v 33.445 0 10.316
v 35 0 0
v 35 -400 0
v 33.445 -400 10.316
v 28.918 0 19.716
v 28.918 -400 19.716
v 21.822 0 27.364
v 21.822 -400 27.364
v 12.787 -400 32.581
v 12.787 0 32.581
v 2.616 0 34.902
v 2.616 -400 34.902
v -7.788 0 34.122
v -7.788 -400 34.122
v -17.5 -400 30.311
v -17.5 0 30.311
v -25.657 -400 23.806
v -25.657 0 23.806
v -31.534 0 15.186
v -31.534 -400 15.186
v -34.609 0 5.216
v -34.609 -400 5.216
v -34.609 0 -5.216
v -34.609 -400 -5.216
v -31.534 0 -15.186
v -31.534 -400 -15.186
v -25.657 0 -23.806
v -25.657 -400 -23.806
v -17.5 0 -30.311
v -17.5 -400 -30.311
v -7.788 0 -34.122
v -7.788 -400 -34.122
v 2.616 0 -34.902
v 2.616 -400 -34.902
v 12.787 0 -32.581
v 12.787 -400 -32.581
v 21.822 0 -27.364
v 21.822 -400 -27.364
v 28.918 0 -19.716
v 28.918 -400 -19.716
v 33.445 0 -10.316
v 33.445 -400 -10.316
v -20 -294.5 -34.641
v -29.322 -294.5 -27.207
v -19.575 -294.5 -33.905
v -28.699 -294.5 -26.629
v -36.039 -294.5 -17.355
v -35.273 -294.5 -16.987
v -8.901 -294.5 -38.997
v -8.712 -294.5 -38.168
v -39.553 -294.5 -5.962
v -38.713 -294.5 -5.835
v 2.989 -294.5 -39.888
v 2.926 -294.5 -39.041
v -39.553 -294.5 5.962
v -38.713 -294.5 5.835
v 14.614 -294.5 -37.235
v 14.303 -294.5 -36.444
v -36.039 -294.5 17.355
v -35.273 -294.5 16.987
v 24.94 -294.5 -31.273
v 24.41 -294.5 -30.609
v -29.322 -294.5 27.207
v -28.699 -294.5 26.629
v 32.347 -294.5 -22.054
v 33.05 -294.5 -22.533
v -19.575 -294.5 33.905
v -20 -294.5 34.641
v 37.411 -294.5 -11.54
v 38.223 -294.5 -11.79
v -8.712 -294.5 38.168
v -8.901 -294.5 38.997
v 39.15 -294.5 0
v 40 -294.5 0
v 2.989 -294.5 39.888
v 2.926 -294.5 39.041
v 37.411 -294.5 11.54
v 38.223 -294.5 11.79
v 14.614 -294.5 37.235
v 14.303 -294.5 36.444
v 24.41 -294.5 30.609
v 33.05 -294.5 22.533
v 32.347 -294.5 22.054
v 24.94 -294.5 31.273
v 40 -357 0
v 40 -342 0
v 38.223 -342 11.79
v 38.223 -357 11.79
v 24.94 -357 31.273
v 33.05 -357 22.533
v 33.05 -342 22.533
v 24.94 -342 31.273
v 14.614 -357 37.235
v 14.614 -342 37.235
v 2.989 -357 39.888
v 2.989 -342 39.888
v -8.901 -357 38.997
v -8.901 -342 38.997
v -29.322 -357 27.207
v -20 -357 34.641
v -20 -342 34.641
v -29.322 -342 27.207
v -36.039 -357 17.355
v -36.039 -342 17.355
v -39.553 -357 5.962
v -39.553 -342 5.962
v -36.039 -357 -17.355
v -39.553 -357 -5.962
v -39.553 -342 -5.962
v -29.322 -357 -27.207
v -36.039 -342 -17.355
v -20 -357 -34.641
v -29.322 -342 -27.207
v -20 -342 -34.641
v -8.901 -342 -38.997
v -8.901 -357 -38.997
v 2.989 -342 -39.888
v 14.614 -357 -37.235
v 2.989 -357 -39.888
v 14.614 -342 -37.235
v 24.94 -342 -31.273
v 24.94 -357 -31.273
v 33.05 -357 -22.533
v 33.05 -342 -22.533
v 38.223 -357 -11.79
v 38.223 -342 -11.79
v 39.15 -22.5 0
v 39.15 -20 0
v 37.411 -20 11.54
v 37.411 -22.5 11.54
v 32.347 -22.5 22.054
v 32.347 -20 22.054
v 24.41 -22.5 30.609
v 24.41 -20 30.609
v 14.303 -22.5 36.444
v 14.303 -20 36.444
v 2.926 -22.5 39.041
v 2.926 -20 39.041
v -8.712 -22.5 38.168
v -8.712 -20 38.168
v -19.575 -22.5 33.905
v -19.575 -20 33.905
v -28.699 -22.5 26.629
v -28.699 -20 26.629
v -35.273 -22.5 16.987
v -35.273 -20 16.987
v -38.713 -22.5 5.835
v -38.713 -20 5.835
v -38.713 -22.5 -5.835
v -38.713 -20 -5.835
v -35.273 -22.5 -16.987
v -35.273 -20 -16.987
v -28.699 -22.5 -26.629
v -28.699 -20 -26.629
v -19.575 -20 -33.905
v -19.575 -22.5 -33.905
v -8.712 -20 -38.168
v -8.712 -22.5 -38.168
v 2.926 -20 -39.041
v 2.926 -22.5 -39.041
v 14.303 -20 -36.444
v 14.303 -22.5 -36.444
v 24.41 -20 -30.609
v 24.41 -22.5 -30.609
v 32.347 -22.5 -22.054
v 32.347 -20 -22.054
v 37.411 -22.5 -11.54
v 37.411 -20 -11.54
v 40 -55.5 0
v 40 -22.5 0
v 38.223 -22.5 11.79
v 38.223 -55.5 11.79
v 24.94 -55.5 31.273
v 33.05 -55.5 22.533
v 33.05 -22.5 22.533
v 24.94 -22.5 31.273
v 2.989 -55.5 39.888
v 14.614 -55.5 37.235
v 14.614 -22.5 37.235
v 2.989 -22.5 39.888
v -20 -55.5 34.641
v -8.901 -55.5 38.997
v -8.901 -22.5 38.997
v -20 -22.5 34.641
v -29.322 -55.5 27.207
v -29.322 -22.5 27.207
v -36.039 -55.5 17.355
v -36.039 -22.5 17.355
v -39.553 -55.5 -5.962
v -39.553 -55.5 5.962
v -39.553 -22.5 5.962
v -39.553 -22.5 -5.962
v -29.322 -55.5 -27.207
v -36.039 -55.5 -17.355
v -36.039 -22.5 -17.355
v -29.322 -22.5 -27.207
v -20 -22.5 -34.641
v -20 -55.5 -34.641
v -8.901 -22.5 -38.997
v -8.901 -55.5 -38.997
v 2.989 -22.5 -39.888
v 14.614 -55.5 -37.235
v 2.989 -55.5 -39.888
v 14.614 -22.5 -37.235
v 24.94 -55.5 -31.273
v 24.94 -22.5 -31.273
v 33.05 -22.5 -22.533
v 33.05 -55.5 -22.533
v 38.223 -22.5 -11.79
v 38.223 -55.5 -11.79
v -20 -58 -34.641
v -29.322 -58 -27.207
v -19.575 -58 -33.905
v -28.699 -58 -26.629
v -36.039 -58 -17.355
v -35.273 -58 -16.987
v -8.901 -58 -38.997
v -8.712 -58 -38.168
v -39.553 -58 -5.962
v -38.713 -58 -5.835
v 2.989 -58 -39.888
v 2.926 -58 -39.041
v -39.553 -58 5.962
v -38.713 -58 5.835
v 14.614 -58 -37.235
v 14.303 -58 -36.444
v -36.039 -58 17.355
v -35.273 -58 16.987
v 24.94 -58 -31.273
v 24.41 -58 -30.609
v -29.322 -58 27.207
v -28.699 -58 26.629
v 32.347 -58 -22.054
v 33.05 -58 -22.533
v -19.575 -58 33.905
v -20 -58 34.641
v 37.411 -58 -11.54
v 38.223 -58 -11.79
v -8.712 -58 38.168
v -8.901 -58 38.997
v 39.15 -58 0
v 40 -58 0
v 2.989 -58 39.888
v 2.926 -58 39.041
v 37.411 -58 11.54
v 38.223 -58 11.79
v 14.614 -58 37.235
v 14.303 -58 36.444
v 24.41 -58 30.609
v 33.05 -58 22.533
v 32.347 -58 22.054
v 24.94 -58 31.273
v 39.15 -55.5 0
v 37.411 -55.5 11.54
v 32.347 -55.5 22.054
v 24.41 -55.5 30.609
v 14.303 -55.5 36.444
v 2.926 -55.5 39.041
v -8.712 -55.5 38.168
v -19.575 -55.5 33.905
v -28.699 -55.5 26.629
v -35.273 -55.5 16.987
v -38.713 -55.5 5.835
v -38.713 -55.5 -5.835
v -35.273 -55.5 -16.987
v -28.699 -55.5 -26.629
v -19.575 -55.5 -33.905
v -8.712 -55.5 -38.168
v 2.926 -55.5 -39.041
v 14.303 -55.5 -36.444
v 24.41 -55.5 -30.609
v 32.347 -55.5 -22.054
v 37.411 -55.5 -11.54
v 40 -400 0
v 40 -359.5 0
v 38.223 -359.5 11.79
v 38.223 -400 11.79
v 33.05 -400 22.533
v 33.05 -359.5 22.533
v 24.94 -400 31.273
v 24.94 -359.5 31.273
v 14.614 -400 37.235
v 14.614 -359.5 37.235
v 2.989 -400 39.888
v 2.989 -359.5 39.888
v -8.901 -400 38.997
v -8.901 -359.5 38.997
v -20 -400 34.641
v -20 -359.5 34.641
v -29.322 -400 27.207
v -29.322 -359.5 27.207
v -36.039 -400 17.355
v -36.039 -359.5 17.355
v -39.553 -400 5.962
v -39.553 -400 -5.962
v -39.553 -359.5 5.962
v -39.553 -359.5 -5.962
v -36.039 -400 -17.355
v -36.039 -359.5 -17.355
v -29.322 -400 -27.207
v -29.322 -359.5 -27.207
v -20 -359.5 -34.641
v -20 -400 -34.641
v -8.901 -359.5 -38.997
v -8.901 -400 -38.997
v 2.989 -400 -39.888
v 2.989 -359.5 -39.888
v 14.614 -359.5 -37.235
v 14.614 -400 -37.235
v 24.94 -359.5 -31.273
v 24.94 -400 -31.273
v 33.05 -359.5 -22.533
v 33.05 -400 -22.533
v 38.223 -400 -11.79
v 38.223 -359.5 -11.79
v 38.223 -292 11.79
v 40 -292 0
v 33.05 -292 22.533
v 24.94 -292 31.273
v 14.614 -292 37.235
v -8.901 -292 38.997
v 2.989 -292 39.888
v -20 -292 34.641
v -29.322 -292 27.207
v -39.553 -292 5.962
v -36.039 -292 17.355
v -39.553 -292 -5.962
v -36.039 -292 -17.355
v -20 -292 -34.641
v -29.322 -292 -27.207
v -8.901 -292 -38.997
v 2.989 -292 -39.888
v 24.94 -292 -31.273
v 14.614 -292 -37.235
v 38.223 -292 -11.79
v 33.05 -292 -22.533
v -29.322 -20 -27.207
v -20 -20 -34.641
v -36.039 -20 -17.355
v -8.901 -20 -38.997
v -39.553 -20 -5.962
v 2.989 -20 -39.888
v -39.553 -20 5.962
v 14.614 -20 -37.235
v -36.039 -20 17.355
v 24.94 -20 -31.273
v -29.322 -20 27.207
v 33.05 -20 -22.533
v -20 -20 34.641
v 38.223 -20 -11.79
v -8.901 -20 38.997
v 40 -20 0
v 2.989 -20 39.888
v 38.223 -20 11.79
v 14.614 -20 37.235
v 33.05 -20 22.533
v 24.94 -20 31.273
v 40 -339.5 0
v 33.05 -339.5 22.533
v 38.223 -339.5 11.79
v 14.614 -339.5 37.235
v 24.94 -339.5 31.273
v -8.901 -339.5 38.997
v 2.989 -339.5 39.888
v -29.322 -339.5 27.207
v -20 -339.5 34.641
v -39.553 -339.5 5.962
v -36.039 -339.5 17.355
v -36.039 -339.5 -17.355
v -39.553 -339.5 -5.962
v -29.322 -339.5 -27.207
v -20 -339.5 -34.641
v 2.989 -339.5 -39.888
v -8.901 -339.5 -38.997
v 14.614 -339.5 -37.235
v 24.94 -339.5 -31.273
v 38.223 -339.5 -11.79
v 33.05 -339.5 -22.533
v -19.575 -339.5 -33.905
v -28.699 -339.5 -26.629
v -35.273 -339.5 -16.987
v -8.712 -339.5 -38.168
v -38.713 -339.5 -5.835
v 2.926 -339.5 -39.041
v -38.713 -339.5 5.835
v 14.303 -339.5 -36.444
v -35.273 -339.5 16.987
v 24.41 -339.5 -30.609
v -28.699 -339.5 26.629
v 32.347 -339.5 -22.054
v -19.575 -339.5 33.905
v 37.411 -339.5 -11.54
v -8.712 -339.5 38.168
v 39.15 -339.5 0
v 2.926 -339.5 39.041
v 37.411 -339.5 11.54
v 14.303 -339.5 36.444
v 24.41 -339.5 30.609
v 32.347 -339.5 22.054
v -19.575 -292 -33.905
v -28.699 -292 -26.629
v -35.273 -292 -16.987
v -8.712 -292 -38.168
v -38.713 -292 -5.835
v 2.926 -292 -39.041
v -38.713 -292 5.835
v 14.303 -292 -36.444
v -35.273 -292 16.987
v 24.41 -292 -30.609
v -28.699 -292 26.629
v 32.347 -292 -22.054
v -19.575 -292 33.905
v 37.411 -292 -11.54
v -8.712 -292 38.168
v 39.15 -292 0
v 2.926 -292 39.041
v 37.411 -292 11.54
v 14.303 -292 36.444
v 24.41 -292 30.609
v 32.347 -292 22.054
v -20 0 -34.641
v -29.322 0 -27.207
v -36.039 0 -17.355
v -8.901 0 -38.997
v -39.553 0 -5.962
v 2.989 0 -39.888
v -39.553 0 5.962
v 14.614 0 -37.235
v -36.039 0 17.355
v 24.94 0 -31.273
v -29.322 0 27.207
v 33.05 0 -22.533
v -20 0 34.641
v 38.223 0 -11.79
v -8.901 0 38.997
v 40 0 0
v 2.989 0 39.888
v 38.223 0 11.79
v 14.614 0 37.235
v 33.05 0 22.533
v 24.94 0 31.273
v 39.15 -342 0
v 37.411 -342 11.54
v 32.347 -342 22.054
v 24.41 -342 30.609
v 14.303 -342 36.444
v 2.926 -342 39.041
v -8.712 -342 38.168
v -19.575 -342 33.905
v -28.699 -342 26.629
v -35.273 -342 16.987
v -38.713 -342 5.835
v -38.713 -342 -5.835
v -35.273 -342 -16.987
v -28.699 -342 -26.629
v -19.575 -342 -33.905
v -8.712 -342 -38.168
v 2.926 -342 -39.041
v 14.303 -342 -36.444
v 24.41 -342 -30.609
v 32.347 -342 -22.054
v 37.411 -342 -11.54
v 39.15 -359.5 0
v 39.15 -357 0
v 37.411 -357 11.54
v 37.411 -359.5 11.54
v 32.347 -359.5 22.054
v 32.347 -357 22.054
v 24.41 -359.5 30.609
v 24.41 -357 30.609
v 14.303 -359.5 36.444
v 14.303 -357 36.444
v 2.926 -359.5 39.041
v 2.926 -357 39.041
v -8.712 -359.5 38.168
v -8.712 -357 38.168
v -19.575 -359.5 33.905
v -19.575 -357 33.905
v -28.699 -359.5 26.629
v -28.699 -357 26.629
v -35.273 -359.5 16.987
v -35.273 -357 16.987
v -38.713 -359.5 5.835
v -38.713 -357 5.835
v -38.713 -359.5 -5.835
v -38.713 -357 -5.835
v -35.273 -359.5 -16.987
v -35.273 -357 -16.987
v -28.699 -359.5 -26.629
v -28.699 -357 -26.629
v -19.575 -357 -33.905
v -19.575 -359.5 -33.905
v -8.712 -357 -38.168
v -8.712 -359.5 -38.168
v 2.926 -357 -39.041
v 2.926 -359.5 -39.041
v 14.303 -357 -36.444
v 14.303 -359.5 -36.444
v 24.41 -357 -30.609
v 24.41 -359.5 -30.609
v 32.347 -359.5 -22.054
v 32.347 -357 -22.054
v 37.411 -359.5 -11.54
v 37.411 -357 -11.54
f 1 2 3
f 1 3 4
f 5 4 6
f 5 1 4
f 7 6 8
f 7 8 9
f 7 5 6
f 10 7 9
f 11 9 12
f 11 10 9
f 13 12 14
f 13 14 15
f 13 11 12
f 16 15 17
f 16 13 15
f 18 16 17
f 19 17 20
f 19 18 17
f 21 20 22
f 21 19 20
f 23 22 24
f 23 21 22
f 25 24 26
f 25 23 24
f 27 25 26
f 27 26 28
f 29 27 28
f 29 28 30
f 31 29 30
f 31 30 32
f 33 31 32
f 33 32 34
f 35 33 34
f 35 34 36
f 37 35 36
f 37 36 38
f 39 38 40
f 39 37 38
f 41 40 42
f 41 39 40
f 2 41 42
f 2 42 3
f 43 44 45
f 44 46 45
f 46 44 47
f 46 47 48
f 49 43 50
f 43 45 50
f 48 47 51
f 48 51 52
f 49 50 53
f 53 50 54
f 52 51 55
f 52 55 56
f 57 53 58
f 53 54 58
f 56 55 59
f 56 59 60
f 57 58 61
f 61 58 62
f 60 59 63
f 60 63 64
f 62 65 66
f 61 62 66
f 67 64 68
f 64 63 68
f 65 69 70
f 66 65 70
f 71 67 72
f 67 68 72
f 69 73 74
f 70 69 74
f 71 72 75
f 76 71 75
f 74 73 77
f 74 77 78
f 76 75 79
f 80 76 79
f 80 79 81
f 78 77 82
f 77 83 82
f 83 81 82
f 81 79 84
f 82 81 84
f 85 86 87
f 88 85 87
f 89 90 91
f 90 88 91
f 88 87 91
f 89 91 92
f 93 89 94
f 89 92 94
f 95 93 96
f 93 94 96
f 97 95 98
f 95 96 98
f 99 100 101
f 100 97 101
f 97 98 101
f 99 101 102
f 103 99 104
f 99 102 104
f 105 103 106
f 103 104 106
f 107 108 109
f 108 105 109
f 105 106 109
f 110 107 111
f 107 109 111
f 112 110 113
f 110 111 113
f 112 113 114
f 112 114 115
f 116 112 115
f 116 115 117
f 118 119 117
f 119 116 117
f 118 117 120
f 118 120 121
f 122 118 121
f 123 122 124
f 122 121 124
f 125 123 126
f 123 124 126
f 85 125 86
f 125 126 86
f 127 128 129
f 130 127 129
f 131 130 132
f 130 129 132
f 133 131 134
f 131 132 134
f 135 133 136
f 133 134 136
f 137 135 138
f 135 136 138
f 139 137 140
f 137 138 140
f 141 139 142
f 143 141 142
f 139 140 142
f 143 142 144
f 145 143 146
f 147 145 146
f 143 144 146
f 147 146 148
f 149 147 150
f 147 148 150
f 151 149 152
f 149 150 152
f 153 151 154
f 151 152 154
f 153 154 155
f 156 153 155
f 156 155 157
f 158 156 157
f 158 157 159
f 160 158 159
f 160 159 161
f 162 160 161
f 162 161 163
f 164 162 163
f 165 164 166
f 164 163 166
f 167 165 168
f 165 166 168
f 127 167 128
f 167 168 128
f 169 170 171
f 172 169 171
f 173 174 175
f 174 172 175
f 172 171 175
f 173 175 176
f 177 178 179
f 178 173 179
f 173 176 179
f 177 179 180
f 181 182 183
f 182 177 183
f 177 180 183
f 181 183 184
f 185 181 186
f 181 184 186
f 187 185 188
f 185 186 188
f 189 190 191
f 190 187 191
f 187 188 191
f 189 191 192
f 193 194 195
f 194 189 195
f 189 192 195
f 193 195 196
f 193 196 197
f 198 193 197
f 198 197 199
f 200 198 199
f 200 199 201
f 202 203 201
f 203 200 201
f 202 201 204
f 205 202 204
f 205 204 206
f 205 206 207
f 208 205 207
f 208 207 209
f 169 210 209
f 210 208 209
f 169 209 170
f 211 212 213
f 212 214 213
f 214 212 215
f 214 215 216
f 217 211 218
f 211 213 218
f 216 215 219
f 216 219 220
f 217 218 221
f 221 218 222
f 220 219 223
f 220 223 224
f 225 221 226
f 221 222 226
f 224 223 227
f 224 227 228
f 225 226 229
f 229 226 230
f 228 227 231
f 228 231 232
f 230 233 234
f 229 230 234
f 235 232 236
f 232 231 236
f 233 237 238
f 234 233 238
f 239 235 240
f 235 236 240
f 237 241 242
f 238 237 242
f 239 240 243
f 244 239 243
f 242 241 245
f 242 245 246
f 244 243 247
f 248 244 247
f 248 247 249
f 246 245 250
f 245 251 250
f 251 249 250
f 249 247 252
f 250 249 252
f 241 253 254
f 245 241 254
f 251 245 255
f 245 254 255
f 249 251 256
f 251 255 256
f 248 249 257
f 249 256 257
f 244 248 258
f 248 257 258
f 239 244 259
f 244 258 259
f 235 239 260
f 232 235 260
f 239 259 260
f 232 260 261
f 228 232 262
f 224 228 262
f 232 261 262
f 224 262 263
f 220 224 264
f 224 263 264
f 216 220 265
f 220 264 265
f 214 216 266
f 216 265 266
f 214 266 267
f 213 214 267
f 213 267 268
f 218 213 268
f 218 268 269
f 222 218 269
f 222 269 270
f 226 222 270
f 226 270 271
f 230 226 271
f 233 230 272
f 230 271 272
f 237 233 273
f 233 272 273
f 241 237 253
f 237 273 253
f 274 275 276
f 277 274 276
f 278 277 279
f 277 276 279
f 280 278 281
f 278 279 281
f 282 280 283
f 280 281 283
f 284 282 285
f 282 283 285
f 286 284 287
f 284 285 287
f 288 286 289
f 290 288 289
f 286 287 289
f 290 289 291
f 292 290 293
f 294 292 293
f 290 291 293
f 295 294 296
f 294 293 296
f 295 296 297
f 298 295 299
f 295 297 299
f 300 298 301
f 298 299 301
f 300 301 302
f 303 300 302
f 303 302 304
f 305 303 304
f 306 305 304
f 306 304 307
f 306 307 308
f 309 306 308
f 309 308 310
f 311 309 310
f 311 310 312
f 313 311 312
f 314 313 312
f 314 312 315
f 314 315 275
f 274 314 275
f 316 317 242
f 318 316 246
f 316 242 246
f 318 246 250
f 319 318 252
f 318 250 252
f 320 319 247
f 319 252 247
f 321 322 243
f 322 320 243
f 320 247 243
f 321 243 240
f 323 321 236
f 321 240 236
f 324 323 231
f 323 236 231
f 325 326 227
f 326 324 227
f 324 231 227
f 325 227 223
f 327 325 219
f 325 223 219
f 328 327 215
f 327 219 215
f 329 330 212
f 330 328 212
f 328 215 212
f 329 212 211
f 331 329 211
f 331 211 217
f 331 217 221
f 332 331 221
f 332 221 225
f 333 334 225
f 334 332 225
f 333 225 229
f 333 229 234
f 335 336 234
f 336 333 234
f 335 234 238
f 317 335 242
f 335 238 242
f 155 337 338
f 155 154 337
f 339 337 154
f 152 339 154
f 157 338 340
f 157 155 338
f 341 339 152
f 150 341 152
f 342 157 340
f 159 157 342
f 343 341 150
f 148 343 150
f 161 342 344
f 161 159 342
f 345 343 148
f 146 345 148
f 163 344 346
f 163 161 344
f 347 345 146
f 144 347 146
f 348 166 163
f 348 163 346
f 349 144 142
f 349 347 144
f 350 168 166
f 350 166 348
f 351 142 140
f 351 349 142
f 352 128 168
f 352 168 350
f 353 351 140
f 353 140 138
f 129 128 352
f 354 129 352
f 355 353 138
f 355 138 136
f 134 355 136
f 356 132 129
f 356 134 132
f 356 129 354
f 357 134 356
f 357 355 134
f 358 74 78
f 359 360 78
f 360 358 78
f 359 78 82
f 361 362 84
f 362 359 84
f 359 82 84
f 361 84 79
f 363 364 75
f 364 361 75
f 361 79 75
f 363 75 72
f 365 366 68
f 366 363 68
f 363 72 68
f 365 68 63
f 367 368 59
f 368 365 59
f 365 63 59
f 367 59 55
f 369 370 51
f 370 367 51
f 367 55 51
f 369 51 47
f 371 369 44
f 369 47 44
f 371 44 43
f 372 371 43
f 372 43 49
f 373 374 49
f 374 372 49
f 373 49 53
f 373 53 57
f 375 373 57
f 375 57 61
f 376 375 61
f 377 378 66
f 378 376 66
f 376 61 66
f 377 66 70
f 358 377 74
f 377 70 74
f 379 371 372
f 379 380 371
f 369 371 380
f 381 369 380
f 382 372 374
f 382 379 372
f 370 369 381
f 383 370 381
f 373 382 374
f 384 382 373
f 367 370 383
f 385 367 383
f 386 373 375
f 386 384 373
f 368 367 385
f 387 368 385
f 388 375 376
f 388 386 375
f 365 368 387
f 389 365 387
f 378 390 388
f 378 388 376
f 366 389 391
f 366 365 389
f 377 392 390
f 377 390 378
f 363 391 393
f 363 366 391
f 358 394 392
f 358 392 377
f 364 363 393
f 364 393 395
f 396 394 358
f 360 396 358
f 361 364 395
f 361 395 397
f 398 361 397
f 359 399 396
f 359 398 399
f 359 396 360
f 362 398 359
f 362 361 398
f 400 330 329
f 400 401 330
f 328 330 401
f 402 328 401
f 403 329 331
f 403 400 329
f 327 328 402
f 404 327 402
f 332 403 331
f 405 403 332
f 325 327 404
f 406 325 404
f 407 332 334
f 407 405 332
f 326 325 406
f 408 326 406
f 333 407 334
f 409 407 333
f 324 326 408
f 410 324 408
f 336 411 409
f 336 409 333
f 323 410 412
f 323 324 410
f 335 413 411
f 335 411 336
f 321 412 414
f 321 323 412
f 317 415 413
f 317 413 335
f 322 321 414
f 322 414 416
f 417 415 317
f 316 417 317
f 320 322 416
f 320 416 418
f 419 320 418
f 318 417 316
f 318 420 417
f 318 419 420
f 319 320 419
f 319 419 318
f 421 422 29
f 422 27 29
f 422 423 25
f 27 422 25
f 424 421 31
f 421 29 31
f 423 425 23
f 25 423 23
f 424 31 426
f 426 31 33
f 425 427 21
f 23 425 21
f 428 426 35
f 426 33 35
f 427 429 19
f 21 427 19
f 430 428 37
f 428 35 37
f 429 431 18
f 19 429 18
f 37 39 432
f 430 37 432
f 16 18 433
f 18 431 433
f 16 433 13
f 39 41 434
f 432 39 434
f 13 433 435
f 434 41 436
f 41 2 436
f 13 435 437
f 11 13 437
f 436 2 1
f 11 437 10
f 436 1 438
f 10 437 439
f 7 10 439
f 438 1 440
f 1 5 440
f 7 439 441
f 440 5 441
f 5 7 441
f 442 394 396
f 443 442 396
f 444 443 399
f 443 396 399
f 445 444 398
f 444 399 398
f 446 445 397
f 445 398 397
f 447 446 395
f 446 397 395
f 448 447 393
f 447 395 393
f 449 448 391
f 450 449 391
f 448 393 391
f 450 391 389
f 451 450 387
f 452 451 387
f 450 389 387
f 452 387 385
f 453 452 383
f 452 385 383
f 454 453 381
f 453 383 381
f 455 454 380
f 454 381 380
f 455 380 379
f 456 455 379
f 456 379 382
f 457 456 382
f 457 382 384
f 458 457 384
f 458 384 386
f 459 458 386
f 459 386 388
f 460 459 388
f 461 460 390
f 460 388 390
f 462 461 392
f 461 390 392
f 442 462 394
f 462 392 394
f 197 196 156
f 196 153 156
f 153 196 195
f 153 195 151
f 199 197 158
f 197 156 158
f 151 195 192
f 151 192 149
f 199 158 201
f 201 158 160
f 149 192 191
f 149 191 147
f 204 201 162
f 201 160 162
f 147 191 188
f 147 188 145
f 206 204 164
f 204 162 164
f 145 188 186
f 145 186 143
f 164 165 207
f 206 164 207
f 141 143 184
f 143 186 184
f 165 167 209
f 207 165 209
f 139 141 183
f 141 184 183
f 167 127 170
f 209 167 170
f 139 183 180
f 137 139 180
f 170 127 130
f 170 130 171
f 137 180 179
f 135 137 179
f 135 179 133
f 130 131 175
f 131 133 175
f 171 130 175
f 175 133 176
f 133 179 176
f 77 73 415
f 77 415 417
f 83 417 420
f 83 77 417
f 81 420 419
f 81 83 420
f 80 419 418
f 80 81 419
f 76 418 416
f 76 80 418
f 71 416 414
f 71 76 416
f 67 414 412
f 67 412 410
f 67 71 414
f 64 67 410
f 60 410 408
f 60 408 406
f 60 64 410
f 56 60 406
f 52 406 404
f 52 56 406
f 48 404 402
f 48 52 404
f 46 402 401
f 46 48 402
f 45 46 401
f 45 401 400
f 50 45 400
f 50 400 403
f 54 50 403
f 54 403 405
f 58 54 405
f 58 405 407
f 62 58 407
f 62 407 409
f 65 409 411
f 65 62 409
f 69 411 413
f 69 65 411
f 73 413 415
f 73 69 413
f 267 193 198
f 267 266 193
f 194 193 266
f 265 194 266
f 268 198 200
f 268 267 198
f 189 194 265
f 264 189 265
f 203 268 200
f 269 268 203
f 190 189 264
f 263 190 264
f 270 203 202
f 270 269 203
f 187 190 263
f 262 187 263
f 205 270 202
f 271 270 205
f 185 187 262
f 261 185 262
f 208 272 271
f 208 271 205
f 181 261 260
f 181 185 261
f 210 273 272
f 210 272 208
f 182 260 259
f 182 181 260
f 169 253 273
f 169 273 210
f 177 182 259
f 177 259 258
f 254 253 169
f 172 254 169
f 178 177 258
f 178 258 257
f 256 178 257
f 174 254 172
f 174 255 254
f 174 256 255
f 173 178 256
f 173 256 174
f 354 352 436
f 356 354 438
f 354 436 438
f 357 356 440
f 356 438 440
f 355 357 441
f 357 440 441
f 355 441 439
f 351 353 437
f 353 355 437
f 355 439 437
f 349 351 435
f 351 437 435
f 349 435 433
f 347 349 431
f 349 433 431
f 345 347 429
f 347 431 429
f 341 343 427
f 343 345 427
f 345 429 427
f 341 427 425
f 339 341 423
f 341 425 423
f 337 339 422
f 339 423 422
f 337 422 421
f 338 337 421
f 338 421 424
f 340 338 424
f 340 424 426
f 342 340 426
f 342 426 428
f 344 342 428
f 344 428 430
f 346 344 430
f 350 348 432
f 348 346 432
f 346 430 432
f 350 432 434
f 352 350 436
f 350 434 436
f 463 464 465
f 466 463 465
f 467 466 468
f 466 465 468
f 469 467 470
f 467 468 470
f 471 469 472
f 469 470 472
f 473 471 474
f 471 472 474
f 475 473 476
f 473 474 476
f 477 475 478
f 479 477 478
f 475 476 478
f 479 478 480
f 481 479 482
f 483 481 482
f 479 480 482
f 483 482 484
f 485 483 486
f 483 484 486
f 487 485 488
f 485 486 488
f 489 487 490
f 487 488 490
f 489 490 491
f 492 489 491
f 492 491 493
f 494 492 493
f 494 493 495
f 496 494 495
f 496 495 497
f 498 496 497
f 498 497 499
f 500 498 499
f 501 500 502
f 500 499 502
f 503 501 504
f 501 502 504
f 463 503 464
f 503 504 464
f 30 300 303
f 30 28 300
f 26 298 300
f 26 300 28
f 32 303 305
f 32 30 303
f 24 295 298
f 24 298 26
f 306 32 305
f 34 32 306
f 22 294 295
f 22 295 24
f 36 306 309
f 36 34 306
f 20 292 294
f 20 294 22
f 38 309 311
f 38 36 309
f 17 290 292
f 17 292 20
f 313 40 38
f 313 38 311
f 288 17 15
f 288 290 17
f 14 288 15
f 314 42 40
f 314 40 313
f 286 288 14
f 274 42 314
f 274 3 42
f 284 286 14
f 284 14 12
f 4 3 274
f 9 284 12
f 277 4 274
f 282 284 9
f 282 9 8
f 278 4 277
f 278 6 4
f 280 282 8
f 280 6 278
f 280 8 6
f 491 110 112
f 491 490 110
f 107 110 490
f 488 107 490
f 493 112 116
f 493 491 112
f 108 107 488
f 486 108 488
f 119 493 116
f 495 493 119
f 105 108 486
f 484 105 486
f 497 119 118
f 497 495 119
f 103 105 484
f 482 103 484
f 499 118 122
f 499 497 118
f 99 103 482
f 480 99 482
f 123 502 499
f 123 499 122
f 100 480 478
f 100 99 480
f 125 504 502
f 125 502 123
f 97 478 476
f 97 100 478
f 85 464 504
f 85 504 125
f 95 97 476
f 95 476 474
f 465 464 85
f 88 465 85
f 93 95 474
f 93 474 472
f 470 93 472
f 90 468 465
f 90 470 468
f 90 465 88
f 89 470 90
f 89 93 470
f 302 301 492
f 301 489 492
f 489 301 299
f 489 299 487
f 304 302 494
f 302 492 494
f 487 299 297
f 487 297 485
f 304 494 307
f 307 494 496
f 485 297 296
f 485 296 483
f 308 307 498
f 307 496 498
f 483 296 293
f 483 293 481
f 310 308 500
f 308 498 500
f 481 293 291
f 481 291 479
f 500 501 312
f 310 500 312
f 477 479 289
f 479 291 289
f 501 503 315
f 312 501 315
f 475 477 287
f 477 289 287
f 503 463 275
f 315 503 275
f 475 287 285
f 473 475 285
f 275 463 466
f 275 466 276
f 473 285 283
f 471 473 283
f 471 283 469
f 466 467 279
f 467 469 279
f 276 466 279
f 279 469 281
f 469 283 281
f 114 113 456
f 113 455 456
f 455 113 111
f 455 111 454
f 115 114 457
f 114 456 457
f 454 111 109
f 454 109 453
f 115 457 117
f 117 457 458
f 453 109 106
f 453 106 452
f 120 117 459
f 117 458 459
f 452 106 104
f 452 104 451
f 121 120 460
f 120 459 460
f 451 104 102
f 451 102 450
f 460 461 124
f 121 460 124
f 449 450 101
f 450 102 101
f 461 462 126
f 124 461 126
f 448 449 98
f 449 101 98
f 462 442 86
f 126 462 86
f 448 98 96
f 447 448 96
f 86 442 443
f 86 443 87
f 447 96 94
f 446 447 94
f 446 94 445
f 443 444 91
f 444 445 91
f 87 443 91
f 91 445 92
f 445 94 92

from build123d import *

# Parameters (mm, degrees)
F0_R      = 40
F0_R_2    = 35
F1_DEPTH  = 400
F3_R      = 44
F3_R_2    = 39.15
F4_DEPTH  = 2.5
F6_R      = 42.5
F6_R_2    = 39.15
F7_DEPTH  = 2.5
F10_R     = 42.5
F10_R_2   = 39.15
F11_DEPTH = 2.5
F13_R     = 42.5
F13_R_2   = 39.15
F14_DEPTH = 2.5
F16_R     = 44
F16_R_2   = 39.15
F17_DEPTH = 2.5
F19_R     = 44
F19_R_2   = 39.15
F20_DEPTH = 2.5
F22_R     = 42.5
F22_R_2   = 39.15
F23_DEPTH = 2.5
F25_R     = 44
F25_R_2   = 39.15
F26_DEPTH = 2.5
F28_R     = 44
F28_R_2   = 39.15
F29_DEPTH = 2.5


with BuildPart() as f1:
    # F0 (on Front) → F1 (new body)
    with BuildSketch(Plane.XZ):
        Circle(F0_R)
        Circle(F0_R_2, mode=Mode.SUBTRACT)
    extrude(amount=F1_DEPTH)

    # F3 (on offset) → F4 (cut)
    with BuildSketch(Plane.XZ.offset(20)):
        Circle(F3_R)
        Circle(F3_R_2, mode=Mode.SUBTRACT)
    extrude(amount=F4_DEPTH, mode=Mode.SUBTRACT)

    # F6 (on offset) → F7 (cut)
    with BuildSketch(Plane.XZ.offset(55.5)):
        Circle(F6_R)
        Circle(F6_R_2, mode=Mode.SUBTRACT)
    extrude(amount=F7_DEPTH, mode=Mode.SUBTRACT)

    # F10 (on offset) → F11 (cut)
    with BuildSketch(Plane.XZ.offset(480)):
        Circle(F10_R)
        Circle(F10_R_2, mode=Mode.SUBTRACT)
    extrude(amount=-F11_DEPTH, mode=Mode.SUBTRACT)

    # F13 (on offset) → F14 (cut)
    with BuildSketch(Plane.XZ.offset(444.5)):
        Circle(F13_R)
        Circle(F13_R_2, mode=Mode.SUBTRACT)
    extrude(amount=-F14_DEPTH, mode=Mode.SUBTRACT)

    # F16 (on offset) → F17 (cut)
    with BuildSketch(Plane.XZ.offset(590)):
        Circle(F16_R)
        Circle(F16_R_2, mode=Mode.SUBTRACT)
    extrude(amount=-F17_DEPTH, mode=Mode.SUBTRACT)

    # F19 (on offset) → F20 (cut)
    with BuildSketch(Plane.XZ.offset(600)):
        Circle(F19_R)
        Circle(F19_R_2, mode=Mode.SUBTRACT)
    extrude(amount=-F20_DEPTH, mode=Mode.SUBTRACT)

    # F22 (on offset) → F23 (cut)
    with BuildSketch(Plane.XZ.offset(294.5)):
        Circle(F22_R)
        Circle(F22_R_2, mode=Mode.SUBTRACT)
    extrude(amount=-F23_DEPTH, mode=Mode.SUBTRACT)

    # F25 (on offset) → F26 (cut)
    with BuildSketch(Plane.XZ.offset(357)):
        Circle(F25_R)
        Circle(F25_R_2, mode=Mode.SUBTRACT)
    extrude(amount=F26_DEPTH, mode=Mode.SUBTRACT)

    # F28 (on offset) → F29 (cut)
    with BuildSketch(Plane.XZ.offset(339.5)):
        Circle(F28_R)
        Circle(F28_R_2, mode=Mode.SUBTRACT)
    extrude(amount=F29_DEPTH, mode=Mode.SUBTRACT)


solid = f1.part
